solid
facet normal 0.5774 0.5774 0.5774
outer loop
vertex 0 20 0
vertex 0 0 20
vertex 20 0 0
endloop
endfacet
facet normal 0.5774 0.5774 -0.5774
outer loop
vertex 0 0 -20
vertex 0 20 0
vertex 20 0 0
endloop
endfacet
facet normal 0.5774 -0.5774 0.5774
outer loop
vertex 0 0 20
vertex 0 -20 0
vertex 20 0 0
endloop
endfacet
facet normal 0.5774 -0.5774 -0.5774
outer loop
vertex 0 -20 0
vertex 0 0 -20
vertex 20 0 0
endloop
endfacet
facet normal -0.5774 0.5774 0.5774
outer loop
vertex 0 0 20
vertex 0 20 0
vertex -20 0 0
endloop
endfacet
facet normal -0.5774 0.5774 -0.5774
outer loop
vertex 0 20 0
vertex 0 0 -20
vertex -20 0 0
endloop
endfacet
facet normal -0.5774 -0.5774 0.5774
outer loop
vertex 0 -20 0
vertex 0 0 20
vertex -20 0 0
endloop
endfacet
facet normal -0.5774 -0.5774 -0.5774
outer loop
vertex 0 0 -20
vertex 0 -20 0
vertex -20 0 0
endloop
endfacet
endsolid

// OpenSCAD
module octahedron(scl) {
     scale(scl)
	  polyhedron (
     points = [[ 1, 0, 0],
	       [-1, 0, 0],
	       [ 0, 1, 0],
	       [ 0,-1, 0],
	       [ 0, 0, 1],
	       [ 0, 0,-1]],
     faces = [[0,4,2],
	      [0,2,5],
	      [0,3,4],
	      [0,5,3],
	      [1,2,4],
	      [1,5,2],
	      [1,4,3],
	      [1,3,5]]
             );
}

octahedron(20);
